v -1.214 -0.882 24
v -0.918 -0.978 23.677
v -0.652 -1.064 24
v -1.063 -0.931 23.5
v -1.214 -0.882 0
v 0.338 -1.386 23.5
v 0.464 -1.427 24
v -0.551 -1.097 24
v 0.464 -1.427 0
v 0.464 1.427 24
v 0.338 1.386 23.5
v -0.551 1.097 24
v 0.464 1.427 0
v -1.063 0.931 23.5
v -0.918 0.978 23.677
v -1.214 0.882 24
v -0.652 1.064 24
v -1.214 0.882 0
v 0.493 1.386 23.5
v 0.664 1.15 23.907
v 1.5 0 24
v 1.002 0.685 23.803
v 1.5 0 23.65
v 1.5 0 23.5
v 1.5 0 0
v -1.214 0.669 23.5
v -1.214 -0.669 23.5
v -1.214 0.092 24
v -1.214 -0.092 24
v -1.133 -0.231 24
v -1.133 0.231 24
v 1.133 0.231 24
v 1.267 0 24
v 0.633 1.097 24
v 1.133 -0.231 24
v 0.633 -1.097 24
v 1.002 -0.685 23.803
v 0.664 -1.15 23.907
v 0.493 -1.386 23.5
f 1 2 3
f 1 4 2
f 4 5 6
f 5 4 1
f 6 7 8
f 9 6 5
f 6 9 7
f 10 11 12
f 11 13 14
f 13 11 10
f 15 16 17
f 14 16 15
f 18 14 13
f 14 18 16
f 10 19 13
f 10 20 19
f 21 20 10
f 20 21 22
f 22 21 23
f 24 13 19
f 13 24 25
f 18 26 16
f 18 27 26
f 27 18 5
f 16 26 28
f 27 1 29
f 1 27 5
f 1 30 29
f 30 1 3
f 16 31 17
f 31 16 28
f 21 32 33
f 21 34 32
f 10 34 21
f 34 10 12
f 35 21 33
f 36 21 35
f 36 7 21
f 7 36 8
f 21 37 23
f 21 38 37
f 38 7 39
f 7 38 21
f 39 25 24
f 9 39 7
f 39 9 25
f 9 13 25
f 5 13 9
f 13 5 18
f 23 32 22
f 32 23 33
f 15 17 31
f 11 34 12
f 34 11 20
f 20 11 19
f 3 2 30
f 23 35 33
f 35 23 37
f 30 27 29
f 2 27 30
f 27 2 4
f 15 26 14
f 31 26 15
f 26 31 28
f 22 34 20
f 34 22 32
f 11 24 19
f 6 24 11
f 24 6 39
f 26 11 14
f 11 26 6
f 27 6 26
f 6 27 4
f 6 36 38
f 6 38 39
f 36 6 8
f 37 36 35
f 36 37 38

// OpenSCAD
// part_id: sat6
// name: SAT6 axle for date pointer drive
// source_drawing_ids: DRW-056
// units: mm
// revision: 0.1-placeholder
// SPDX-License-Identifier: MIT

module part_sat6(axle_d = 3, axle_h = 24, tip_chamfer = 0.5) {
    difference() {
        cylinder(d = axle_d, h = axle_h, center = false);
        translate([0, 0, axle_h - tip_chamfer])
            cylinder(d1 = axle_d + 0.2, d2 = axle_d - 0.6, h = tip_chamfer + 0.1, center = false);
    }
}


// ---- "main guard" ----
// Default to previewing when opened directly:
if (is_undef(__LIB_MODE__)) {
    part_sat6();
}
